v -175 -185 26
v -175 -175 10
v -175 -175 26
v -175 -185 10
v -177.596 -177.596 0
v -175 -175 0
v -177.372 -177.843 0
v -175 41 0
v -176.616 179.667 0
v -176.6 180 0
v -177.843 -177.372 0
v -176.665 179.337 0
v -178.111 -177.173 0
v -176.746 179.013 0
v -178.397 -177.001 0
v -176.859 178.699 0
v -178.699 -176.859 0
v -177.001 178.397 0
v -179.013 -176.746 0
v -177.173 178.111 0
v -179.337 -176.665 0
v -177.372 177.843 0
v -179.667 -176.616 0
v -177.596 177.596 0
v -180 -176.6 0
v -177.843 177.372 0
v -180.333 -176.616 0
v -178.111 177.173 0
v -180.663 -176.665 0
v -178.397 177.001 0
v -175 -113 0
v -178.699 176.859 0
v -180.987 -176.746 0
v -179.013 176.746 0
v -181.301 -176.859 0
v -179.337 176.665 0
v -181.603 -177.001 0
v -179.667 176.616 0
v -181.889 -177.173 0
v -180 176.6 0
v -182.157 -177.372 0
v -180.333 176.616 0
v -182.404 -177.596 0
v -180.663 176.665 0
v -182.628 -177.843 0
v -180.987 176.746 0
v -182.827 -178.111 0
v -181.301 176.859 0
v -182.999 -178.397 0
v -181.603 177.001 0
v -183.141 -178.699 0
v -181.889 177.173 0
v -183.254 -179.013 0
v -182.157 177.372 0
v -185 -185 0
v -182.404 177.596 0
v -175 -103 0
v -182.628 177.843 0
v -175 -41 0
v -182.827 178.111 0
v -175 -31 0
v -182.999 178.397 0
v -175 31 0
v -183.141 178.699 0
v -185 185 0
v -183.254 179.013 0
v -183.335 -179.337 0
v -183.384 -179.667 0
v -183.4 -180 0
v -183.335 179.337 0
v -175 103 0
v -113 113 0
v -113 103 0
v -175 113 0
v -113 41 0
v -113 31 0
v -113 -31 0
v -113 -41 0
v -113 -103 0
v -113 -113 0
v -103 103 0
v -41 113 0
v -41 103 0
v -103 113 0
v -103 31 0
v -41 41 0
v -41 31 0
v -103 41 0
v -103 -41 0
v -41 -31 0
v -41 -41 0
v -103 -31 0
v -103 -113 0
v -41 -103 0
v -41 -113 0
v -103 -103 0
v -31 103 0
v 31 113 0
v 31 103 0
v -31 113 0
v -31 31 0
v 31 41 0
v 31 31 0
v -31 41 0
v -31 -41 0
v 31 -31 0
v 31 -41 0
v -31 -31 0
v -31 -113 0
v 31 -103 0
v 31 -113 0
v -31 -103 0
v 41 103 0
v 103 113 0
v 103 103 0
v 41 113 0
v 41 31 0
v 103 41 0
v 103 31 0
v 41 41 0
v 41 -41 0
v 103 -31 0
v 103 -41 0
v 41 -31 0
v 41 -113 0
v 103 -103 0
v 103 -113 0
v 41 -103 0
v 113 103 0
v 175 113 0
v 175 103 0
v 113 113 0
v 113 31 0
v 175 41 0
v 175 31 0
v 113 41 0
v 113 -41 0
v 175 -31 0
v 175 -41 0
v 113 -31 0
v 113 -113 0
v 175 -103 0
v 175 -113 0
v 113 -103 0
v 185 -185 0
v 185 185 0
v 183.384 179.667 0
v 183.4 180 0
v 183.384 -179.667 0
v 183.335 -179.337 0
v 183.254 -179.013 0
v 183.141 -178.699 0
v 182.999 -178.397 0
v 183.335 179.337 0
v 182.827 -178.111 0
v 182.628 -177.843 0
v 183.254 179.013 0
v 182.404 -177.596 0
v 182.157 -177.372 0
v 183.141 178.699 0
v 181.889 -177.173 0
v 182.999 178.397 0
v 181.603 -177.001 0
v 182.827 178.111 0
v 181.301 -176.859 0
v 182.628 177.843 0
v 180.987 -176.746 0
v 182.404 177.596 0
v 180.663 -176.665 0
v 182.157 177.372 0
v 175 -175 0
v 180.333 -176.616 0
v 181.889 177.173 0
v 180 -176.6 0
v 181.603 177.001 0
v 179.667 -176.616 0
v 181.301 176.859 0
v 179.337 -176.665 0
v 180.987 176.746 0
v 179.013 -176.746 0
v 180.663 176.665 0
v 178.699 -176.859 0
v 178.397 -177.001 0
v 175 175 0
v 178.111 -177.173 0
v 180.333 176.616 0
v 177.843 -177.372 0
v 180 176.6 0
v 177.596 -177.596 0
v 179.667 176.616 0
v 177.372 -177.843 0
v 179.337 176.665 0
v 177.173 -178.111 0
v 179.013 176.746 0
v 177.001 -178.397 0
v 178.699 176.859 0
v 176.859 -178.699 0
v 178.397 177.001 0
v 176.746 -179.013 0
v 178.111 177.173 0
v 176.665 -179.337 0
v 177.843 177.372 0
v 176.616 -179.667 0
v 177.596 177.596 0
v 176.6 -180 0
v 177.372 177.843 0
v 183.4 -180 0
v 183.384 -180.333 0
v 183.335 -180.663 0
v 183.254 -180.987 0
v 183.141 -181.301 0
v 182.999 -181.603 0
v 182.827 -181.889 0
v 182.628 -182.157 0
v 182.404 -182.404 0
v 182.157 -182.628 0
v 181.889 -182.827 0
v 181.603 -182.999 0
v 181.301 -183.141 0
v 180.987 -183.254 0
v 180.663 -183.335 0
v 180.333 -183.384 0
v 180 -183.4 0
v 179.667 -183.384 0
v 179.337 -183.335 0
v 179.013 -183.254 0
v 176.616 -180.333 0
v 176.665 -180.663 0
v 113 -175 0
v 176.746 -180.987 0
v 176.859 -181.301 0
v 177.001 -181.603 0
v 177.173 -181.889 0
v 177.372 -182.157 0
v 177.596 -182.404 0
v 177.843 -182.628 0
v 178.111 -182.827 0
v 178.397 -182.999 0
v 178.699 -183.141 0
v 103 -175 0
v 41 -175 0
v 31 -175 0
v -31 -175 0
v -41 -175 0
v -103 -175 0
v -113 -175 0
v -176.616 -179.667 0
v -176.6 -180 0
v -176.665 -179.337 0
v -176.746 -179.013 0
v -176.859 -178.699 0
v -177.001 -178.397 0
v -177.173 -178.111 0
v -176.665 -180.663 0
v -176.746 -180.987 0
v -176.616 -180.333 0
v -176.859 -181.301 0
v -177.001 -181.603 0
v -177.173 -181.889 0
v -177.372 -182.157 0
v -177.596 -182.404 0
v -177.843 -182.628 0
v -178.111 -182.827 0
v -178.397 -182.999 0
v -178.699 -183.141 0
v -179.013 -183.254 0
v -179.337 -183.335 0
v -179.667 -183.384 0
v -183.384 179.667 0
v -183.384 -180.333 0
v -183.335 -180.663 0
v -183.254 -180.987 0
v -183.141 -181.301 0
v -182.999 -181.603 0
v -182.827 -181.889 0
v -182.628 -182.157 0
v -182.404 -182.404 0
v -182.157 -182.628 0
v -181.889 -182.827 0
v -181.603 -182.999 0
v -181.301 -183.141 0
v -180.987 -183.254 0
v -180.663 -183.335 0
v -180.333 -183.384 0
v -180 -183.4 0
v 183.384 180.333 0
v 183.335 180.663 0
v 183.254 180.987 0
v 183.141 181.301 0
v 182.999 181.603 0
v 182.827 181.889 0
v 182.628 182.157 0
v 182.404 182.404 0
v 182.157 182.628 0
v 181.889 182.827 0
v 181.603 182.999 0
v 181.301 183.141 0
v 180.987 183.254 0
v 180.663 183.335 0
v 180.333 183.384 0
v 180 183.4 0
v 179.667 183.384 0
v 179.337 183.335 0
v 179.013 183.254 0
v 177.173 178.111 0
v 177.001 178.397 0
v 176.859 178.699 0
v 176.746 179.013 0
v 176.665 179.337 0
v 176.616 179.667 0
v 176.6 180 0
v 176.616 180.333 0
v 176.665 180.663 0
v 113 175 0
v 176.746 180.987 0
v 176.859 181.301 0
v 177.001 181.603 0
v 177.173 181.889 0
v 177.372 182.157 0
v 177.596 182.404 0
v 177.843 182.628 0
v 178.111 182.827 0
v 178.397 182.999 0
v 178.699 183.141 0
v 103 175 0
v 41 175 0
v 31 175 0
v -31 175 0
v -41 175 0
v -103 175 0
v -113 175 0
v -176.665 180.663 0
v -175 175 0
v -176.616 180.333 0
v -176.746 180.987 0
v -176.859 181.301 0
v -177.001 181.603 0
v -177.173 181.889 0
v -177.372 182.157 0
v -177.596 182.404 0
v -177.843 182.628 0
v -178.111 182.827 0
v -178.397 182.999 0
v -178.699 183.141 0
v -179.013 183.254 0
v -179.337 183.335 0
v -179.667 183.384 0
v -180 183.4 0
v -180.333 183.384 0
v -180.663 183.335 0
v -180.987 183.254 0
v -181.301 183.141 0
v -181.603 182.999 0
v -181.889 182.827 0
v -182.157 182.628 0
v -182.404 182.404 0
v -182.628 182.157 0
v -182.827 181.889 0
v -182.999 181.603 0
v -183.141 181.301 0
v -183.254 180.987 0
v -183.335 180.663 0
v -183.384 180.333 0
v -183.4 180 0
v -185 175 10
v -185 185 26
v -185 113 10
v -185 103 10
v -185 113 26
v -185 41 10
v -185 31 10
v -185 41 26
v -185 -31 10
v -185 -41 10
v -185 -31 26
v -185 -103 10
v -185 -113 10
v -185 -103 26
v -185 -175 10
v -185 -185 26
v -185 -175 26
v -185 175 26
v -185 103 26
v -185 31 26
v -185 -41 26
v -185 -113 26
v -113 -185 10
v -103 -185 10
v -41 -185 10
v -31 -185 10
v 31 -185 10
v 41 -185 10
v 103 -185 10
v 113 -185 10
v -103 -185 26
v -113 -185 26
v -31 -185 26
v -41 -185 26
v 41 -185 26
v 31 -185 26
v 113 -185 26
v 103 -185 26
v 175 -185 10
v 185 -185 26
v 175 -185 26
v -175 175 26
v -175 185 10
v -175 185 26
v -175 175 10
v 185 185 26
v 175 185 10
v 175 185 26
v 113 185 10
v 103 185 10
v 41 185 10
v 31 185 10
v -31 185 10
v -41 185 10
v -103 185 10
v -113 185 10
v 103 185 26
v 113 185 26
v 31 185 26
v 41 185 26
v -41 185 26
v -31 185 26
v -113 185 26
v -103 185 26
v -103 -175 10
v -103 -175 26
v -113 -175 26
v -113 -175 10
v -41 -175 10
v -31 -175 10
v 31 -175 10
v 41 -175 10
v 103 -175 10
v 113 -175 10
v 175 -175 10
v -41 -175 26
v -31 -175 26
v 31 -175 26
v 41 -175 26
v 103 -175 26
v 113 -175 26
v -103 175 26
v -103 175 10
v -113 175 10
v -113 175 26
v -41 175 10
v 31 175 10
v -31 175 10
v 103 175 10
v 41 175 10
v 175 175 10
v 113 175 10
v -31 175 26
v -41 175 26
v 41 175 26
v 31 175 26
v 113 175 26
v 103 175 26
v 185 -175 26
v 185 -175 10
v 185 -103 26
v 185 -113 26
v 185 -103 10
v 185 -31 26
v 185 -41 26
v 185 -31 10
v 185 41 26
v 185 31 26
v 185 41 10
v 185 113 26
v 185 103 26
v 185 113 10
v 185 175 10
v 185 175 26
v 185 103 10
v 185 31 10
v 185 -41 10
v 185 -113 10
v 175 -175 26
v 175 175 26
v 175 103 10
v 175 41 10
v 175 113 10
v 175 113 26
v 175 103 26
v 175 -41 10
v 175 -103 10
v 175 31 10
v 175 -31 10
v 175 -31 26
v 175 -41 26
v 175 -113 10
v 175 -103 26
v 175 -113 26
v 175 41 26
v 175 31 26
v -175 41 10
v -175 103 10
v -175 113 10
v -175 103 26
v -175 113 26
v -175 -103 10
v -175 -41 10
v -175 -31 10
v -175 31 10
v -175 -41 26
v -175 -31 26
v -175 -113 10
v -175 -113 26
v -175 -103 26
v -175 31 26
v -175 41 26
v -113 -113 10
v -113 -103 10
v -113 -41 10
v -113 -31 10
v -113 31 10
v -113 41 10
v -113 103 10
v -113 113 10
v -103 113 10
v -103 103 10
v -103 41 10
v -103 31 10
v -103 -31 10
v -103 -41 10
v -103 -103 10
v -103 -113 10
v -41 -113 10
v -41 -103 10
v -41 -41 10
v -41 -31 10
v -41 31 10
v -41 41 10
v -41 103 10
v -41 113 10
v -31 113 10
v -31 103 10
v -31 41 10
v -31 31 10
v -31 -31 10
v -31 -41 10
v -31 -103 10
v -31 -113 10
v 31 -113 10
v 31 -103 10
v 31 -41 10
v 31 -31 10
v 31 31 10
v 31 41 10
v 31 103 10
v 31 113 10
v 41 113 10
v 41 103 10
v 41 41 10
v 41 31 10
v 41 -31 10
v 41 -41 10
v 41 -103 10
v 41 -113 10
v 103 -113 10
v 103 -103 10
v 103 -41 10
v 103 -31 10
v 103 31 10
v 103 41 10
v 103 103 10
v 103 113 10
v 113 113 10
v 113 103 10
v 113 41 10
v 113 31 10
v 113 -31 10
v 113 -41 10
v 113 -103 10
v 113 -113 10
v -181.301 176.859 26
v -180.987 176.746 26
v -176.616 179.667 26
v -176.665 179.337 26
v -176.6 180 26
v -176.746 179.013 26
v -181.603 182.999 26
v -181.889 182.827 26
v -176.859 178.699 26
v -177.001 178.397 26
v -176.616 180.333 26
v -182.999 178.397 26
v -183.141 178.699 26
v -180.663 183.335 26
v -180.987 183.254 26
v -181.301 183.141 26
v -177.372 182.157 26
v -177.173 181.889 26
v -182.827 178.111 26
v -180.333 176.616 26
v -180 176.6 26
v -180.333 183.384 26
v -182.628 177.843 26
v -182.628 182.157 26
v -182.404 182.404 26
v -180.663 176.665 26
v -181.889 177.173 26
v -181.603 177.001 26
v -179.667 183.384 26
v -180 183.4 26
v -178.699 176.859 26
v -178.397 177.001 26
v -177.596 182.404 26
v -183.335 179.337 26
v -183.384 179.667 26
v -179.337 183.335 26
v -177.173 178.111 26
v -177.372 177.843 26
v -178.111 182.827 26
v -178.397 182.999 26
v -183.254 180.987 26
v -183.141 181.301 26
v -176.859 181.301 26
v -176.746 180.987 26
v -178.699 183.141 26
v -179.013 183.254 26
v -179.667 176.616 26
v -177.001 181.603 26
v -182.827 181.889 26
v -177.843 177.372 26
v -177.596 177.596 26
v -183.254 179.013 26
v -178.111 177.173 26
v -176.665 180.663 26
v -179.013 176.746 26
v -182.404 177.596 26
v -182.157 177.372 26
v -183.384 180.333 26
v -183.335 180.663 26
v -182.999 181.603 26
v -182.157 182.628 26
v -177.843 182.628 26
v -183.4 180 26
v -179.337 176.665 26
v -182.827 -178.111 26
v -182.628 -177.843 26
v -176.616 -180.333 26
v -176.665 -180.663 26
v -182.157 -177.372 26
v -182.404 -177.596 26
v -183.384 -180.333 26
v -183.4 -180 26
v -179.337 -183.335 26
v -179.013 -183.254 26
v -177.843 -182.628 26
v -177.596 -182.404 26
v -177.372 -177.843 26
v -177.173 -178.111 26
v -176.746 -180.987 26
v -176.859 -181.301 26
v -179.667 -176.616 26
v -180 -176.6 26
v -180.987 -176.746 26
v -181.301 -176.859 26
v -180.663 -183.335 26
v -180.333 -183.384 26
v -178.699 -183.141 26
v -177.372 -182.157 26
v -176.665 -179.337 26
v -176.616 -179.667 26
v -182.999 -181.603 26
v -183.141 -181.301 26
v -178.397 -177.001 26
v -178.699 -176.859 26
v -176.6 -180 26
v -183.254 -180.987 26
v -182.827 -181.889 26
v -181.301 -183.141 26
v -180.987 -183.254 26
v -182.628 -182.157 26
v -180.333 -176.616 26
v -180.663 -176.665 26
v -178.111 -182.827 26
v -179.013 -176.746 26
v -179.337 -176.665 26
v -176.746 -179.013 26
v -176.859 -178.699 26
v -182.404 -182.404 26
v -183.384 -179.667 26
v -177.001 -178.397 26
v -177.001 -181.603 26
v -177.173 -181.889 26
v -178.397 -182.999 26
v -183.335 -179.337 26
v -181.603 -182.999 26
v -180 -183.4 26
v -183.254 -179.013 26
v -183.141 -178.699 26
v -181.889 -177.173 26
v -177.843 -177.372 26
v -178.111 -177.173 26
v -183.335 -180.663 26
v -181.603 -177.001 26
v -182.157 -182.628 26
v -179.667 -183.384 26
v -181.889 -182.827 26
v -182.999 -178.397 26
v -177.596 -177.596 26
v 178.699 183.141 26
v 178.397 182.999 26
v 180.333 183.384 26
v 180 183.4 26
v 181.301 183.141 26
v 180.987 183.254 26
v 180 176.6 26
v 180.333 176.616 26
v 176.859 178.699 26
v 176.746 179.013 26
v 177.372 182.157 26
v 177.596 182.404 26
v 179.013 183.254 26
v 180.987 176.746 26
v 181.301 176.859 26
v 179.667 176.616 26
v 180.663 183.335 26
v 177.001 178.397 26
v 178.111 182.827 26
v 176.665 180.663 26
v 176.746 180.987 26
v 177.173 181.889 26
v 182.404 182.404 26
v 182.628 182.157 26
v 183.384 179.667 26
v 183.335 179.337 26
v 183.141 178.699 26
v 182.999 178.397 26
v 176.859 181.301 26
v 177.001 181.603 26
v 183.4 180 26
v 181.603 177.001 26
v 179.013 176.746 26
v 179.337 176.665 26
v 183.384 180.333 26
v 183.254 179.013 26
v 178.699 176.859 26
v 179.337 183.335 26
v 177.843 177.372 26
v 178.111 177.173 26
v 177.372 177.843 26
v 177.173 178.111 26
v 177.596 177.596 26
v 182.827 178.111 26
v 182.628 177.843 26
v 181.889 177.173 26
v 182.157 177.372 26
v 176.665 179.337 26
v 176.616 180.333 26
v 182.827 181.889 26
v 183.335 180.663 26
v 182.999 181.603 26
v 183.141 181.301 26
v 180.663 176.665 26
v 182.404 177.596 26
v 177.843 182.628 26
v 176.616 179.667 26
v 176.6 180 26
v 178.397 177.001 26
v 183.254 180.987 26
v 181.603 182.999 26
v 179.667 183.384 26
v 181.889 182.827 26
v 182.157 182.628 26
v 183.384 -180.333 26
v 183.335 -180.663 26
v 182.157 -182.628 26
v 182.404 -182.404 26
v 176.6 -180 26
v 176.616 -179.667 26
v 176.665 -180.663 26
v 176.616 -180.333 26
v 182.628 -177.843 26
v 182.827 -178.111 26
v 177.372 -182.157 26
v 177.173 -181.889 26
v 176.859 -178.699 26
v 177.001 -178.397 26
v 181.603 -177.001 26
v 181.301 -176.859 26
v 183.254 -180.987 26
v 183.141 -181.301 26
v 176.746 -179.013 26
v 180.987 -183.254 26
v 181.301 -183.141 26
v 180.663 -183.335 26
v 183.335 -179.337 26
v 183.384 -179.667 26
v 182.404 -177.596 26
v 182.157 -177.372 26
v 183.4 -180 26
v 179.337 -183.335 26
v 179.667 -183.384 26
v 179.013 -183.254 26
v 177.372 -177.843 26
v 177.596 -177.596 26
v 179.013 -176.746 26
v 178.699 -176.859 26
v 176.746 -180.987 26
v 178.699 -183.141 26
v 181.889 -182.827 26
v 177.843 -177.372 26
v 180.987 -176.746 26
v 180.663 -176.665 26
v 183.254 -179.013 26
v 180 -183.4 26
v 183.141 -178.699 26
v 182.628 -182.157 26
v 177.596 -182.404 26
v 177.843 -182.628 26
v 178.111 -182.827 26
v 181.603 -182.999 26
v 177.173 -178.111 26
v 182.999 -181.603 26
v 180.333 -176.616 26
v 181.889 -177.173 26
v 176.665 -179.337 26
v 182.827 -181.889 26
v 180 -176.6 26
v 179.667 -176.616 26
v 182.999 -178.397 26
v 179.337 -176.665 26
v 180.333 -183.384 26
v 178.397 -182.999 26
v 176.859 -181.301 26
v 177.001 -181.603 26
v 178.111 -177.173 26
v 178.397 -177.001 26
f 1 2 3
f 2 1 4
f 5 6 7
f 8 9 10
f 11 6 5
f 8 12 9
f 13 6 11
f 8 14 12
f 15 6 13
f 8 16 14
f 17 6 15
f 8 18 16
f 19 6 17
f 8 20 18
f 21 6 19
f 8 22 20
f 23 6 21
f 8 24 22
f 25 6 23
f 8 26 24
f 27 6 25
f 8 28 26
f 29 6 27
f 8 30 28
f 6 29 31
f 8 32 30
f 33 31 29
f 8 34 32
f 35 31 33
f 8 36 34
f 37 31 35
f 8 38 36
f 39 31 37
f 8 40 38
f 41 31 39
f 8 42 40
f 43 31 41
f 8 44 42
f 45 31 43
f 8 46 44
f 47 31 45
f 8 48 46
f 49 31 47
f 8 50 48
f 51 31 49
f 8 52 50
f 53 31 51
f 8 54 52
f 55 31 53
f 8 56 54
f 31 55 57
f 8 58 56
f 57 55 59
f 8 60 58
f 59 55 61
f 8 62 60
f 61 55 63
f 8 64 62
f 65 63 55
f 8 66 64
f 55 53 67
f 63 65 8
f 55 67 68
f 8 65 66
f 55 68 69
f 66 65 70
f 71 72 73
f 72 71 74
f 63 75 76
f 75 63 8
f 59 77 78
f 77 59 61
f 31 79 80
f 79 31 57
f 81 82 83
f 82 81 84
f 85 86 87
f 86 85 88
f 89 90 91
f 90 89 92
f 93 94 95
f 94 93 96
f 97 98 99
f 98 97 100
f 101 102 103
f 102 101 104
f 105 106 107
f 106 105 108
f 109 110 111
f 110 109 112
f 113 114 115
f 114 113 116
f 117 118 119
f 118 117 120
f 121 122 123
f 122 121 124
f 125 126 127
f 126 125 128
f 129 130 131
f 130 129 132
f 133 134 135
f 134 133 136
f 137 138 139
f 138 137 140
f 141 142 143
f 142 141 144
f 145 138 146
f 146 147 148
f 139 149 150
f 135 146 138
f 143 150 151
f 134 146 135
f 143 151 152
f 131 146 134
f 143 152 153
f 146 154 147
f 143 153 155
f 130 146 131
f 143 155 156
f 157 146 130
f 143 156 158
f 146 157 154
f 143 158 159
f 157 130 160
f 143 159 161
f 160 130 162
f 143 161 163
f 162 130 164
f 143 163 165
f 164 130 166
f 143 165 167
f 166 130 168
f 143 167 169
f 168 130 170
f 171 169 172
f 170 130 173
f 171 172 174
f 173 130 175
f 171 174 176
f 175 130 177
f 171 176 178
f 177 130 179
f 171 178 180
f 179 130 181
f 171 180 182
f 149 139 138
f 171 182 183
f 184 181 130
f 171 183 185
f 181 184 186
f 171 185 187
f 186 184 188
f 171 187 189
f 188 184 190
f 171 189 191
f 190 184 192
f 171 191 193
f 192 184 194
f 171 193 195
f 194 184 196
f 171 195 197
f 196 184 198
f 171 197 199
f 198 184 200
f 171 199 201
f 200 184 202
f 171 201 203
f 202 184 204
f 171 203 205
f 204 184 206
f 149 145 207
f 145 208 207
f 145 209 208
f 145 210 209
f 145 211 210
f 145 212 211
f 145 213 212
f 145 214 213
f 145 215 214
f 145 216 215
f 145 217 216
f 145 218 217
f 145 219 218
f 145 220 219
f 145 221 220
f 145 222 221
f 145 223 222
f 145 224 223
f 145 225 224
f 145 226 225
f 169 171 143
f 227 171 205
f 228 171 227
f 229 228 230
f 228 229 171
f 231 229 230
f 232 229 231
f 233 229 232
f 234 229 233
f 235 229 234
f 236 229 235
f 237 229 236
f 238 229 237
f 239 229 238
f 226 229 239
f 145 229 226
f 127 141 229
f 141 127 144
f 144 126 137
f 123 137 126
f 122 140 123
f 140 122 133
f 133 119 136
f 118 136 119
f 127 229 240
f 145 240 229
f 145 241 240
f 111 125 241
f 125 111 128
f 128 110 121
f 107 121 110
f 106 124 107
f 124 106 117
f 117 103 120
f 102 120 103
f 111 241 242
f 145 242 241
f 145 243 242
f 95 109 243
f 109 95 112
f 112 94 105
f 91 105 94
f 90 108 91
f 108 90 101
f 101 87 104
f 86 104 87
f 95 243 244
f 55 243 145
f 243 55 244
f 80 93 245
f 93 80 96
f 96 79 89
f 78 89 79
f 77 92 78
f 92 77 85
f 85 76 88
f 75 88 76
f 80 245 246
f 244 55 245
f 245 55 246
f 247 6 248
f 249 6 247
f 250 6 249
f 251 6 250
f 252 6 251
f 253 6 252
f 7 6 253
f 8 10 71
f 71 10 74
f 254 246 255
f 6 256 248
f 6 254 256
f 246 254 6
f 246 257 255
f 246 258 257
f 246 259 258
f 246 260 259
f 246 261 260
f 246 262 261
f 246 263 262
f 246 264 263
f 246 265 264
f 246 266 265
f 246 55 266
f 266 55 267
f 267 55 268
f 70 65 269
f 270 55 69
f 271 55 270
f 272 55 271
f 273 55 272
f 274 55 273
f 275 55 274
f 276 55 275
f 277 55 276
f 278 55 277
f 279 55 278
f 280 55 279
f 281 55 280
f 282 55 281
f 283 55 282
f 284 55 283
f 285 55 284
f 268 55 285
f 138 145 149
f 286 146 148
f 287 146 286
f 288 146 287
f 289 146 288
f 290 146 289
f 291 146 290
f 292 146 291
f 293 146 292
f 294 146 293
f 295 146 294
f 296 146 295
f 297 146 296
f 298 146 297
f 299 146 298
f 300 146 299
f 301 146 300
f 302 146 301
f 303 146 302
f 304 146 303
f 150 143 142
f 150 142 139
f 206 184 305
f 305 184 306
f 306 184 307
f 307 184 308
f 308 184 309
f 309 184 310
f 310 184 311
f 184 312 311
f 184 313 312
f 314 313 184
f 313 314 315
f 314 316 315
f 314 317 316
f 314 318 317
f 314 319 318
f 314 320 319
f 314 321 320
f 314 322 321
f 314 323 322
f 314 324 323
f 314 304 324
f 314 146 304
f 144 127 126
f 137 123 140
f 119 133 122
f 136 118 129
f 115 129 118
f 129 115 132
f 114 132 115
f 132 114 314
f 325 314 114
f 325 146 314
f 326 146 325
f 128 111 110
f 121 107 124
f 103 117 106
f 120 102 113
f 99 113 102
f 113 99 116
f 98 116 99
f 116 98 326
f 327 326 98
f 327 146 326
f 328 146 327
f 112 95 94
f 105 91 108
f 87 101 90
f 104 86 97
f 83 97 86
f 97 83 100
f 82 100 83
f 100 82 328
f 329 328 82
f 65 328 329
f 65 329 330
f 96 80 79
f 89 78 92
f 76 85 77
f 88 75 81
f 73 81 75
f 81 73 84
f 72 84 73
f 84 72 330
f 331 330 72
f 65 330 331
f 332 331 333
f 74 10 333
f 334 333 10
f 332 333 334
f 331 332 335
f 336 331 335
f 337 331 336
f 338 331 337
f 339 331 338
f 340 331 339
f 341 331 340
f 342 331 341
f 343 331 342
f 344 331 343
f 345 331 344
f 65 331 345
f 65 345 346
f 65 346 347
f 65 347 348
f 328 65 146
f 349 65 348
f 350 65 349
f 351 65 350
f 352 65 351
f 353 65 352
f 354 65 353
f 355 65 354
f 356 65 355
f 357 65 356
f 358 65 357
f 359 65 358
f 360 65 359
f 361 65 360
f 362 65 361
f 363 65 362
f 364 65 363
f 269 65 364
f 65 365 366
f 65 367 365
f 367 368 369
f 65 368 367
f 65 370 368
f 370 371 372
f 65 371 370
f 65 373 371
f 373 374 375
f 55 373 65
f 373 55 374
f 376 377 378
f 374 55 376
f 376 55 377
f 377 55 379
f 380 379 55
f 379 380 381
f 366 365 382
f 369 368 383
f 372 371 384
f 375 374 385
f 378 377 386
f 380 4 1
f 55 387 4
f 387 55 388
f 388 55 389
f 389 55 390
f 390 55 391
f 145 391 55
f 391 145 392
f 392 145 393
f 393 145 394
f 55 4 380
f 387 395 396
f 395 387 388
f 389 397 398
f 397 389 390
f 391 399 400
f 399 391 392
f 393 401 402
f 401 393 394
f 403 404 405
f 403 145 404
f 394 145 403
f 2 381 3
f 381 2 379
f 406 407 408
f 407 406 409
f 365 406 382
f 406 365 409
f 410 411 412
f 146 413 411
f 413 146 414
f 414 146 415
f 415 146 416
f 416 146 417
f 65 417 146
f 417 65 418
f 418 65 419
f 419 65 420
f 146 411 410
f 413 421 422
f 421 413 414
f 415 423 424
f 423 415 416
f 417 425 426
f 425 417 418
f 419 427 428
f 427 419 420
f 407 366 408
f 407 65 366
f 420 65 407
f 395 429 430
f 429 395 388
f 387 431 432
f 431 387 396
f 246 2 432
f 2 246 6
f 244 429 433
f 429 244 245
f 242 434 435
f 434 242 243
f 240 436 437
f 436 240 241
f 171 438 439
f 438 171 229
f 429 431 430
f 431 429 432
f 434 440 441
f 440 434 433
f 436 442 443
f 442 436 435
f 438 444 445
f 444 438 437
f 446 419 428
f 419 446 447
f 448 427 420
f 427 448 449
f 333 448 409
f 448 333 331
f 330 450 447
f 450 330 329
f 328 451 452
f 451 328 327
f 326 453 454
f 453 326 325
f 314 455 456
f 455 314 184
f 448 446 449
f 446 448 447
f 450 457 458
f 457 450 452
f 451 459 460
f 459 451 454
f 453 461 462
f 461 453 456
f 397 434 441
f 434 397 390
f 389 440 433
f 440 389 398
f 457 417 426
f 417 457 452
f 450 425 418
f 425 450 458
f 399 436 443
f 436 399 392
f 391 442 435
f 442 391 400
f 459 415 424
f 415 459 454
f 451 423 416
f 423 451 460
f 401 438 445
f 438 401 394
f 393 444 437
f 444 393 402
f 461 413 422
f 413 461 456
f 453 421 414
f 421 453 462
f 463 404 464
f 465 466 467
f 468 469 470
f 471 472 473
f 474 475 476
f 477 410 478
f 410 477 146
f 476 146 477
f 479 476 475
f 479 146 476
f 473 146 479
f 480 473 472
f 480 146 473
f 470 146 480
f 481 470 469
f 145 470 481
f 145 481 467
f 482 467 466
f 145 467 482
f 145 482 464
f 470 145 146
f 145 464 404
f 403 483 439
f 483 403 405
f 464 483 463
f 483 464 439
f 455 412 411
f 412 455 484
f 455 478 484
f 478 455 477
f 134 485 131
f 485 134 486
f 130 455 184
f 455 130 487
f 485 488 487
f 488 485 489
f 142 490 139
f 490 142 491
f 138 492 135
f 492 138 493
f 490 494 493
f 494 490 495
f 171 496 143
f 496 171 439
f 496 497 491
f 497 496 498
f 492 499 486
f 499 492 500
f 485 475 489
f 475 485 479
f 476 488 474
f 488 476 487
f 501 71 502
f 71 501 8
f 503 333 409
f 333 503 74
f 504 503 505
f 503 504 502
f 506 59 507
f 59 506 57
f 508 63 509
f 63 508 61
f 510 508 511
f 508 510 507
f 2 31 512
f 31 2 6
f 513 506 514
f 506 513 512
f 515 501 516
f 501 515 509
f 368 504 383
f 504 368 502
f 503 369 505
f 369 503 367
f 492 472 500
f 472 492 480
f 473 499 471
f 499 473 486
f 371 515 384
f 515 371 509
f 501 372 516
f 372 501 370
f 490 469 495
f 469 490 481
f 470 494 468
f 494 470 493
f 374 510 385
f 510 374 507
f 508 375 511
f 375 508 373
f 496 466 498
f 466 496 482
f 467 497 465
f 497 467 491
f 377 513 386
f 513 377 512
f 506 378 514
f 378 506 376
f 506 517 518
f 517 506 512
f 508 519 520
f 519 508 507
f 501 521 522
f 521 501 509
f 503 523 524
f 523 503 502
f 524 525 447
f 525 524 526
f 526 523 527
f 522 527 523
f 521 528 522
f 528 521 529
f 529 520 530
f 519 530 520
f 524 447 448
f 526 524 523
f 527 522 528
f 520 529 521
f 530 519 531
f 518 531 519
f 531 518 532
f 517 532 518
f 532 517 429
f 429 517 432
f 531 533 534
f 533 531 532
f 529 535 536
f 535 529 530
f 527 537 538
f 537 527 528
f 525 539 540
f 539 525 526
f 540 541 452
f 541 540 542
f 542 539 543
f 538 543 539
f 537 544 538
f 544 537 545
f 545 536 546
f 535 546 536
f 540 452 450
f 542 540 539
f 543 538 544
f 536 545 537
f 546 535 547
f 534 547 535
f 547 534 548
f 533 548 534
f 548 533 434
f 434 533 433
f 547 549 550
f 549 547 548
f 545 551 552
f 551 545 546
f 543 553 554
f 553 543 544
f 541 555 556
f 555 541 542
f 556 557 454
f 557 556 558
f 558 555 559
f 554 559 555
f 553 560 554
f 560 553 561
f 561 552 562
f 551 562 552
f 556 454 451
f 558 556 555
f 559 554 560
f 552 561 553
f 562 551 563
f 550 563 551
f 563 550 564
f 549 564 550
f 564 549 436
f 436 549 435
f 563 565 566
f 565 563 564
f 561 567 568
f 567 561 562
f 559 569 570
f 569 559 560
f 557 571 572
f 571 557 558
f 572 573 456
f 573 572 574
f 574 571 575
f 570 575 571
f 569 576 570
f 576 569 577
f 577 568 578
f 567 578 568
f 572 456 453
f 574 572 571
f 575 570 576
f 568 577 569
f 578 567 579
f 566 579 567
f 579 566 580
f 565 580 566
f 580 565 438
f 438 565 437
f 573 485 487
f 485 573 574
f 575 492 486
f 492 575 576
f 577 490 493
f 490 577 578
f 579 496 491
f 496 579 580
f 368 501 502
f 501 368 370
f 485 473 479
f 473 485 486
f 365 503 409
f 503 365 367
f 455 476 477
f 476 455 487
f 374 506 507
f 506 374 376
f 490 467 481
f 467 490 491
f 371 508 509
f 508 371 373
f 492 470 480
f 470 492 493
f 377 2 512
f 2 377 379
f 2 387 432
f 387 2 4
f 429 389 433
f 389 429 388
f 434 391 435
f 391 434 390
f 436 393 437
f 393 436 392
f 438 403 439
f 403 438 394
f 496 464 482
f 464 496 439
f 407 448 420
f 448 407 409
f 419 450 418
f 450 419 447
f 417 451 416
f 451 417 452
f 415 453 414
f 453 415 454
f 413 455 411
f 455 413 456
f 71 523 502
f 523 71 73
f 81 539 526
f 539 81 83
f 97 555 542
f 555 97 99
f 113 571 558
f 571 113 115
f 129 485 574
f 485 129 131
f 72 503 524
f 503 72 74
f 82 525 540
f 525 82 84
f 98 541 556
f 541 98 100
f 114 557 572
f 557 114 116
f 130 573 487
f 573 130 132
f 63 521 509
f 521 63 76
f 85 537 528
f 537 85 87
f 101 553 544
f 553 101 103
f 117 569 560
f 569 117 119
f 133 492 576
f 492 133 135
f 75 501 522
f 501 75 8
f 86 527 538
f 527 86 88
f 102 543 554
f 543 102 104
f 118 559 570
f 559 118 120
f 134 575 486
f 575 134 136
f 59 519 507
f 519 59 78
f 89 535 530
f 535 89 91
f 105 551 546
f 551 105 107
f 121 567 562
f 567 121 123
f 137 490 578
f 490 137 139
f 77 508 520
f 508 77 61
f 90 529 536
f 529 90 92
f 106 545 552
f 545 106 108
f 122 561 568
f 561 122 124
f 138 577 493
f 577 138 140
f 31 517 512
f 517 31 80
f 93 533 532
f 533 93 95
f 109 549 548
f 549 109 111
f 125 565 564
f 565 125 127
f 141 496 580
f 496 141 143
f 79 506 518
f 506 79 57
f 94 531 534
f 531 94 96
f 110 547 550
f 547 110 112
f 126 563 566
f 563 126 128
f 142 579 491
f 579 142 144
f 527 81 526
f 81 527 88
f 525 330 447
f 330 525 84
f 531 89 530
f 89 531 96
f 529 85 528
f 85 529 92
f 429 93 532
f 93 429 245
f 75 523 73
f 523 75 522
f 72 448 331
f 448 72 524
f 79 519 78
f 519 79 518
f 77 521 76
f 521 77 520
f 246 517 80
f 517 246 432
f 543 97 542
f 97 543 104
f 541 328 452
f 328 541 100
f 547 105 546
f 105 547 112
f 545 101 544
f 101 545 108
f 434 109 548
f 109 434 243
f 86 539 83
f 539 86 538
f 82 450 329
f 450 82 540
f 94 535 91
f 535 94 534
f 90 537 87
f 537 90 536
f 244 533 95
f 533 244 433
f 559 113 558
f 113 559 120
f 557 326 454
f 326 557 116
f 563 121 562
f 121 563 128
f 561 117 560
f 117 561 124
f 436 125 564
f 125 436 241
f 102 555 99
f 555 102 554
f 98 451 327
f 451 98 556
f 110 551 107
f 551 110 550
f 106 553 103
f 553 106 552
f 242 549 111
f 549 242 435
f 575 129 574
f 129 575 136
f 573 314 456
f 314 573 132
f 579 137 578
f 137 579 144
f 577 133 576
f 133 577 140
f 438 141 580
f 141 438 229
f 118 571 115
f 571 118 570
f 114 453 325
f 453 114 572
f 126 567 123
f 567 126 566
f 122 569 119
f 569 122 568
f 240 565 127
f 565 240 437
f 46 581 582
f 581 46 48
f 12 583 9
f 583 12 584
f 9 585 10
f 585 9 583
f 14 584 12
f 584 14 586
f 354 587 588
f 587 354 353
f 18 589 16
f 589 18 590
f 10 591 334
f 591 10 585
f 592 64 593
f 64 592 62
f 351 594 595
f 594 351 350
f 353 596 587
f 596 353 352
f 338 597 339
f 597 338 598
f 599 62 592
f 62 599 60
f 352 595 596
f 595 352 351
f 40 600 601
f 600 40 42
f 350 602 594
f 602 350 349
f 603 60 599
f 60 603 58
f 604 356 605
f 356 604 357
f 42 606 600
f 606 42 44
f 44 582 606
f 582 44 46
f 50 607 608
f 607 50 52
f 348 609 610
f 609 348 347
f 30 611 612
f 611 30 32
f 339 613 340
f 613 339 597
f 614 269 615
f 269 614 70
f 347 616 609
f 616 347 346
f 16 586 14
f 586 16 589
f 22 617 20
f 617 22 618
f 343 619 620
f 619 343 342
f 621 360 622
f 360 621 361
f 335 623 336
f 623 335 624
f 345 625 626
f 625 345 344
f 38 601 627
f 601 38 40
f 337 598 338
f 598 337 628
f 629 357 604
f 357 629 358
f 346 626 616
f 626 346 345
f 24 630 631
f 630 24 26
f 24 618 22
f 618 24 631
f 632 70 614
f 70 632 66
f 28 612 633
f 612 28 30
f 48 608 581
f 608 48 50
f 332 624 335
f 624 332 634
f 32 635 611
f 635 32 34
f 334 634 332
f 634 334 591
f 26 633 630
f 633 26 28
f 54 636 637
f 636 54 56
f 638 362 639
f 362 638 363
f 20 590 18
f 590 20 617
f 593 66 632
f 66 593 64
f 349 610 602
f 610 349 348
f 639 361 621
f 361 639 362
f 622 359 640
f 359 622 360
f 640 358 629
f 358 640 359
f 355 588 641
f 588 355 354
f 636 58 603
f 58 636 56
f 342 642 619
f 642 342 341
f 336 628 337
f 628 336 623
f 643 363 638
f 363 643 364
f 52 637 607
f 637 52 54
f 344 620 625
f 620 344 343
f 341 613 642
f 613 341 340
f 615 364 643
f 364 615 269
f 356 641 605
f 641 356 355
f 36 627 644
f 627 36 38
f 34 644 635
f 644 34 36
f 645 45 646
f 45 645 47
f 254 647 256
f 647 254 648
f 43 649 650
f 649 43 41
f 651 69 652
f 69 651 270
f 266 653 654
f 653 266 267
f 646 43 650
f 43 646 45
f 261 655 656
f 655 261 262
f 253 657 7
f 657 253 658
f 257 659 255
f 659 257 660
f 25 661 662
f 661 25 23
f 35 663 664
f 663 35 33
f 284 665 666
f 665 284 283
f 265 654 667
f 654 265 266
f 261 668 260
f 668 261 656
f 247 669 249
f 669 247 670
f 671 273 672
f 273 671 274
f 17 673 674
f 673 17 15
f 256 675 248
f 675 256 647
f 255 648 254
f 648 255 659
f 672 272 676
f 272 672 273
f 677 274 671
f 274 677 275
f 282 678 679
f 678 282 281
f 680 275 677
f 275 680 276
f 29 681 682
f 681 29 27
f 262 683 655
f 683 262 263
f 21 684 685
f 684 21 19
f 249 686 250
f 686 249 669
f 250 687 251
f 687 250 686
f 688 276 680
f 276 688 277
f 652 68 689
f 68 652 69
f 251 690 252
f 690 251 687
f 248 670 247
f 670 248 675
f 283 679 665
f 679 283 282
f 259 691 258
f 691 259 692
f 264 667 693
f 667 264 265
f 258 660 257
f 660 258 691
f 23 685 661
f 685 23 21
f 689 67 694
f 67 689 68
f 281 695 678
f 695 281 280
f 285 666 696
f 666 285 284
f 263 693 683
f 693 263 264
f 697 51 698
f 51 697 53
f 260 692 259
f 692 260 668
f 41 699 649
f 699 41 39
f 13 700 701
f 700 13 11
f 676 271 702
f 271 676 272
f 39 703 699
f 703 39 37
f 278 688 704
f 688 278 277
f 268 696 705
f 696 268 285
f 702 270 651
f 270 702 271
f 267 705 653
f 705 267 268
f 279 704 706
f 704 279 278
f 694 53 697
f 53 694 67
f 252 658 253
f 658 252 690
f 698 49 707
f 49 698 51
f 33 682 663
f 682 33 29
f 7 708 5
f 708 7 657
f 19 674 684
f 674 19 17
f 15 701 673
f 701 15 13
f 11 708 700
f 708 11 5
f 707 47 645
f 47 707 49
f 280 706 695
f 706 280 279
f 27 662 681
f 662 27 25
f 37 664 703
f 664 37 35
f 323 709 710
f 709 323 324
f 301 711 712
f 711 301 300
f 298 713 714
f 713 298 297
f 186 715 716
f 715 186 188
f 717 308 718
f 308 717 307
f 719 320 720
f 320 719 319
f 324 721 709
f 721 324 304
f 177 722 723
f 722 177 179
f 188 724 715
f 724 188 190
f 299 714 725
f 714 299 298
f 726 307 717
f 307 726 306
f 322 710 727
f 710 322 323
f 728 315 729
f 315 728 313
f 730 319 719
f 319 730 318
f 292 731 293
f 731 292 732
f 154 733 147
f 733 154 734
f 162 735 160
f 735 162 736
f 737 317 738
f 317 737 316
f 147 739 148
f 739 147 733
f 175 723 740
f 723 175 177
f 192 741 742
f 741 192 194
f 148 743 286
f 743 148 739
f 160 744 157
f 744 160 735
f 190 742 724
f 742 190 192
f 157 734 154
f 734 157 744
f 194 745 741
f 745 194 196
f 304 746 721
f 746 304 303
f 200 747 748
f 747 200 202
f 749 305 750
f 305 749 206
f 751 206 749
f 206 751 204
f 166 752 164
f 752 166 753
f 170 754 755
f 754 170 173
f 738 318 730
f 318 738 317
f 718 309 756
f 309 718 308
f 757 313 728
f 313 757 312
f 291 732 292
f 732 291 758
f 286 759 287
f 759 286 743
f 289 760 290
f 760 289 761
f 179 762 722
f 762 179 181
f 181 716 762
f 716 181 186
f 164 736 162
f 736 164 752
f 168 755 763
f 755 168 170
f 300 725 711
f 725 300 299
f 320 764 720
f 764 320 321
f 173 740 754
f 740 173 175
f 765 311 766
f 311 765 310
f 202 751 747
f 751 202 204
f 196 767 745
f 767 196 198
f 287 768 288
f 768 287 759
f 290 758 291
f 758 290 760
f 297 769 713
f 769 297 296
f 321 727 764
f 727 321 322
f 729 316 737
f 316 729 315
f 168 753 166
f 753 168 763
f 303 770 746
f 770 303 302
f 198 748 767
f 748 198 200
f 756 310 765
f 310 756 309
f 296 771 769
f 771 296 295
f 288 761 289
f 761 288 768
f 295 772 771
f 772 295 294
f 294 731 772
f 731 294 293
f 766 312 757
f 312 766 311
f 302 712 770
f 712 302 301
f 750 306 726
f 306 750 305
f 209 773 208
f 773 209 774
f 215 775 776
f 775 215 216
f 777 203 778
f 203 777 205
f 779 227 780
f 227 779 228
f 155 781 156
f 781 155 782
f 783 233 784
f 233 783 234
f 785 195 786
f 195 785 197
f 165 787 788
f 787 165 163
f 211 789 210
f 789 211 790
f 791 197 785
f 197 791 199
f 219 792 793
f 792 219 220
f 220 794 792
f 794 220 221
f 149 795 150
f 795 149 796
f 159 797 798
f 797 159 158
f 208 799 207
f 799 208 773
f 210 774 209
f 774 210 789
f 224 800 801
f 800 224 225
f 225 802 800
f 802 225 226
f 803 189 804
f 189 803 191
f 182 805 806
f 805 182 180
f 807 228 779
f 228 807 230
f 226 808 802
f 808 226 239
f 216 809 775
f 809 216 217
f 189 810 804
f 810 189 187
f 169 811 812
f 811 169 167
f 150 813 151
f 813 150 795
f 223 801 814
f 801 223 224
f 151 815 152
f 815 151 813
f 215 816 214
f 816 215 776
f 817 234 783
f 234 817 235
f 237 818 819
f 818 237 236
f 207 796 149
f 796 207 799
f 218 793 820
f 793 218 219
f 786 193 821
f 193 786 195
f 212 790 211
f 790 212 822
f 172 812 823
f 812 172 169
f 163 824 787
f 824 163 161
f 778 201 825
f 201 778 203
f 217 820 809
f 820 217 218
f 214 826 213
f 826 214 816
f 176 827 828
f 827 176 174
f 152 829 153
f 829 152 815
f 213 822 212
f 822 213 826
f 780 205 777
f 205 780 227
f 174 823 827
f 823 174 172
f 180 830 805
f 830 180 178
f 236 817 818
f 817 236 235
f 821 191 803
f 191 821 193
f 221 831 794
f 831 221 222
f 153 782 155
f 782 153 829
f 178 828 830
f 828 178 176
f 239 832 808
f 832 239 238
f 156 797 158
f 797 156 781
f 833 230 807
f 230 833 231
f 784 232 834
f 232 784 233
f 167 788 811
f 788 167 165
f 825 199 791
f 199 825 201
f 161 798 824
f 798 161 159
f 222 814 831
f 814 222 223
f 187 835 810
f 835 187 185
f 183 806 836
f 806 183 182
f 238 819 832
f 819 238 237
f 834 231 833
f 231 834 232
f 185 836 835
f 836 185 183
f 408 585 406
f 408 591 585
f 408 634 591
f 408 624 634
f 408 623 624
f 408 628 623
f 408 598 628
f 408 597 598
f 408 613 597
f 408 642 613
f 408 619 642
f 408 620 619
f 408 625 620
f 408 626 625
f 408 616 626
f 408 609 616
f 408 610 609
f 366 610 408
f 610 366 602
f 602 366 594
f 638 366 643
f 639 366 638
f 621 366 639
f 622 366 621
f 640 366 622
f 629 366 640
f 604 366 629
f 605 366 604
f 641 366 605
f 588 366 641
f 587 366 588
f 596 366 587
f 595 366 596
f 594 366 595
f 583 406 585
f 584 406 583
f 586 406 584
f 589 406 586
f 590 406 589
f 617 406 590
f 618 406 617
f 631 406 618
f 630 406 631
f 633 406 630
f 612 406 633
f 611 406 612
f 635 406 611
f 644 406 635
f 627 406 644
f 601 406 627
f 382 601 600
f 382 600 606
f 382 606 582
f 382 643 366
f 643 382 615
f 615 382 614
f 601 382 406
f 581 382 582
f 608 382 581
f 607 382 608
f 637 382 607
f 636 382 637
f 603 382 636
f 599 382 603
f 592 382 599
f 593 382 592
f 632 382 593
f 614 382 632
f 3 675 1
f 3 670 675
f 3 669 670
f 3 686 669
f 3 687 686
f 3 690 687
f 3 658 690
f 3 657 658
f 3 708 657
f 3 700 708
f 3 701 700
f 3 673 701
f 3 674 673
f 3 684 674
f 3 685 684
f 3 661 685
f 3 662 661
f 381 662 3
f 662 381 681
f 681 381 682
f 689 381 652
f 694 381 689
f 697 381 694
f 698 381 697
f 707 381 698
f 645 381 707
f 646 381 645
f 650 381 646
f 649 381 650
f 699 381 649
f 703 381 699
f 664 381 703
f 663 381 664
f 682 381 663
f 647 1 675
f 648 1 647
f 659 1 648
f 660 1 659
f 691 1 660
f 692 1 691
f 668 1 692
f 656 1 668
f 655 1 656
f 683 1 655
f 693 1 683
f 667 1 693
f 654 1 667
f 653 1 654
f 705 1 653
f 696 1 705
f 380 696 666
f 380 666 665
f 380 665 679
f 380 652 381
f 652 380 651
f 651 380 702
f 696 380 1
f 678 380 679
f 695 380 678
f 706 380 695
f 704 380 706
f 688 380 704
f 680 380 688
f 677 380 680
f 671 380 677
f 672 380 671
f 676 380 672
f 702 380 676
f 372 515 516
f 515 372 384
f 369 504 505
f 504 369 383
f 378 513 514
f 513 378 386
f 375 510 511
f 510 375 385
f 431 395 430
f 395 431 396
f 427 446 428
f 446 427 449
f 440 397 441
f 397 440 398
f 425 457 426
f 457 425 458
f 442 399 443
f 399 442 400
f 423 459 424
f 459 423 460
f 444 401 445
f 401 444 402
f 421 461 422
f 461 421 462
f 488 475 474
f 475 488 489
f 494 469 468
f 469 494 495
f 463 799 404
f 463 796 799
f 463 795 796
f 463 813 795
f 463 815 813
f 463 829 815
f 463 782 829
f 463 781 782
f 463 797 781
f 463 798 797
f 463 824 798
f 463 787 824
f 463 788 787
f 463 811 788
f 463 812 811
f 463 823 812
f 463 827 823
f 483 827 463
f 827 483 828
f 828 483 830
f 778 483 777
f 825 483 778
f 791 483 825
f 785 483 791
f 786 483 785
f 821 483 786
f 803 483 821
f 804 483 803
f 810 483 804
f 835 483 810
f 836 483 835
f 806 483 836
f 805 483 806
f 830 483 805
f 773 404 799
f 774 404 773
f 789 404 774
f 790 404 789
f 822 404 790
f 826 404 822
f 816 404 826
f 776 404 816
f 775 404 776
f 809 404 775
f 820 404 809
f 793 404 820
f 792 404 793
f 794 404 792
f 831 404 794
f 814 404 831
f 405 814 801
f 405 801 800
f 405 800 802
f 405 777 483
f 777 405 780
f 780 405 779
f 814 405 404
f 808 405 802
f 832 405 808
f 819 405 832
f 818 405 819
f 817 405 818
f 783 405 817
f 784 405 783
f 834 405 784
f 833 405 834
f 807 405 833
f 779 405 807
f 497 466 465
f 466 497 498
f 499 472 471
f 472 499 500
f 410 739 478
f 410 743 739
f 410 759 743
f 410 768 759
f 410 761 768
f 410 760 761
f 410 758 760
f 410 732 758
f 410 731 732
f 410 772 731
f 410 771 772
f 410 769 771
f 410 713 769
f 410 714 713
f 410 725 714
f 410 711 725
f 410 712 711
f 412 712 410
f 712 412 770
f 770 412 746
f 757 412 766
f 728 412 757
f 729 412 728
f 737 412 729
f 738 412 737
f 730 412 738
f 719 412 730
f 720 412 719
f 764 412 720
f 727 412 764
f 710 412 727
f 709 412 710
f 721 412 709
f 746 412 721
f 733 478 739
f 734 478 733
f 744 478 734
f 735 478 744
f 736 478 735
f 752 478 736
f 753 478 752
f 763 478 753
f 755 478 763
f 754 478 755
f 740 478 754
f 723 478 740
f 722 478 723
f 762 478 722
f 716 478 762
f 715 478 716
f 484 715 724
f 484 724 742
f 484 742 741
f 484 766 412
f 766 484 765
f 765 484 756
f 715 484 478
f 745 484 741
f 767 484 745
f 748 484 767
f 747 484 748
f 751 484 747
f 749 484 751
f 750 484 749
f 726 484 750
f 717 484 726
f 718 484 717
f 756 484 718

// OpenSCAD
// Cage slice part (z0..z1). Units: mm.
// Print orientation: flipped (top grid prints on the bed, no supports)

bar=10;
inner=[350,350,700];
gap_xy=62;
gap_z=61;
hole_d=6.8;
$fn=64;

outer=[inner[0]+2*bar, inner[1]+2*bar, inner[2]+2*bar];
half=[outer[0]/2, outer[1]/2, outer[2]/2];

pitch_xy=bar+gap_xy;
pitch_z=bar+gap_z;

centers=[for(i=[0:5]) -(half[0]-bar/2) + i*pitch_xy];
z_levels=[for(i=[0:10]) i*pitch_z];

module vbar(xc,yc){ translate([xc-bar/2,yc-bar/2,0]) cube([bar,bar,outer[2]],center=false); }
module hbar_x(yc,z0){ translate([-half[0],yc-bar/2,z0]) cube([outer[0],bar,bar],center=false); }
module hbar_y(xc,z0){ translate([xc-bar/2,-half[1],z0]) cube([bar,outer[1],bar],center=false); }

module grid(z0){ union(){ for(yc=centers) hbar_x(yc,z0); for(xc=centers) hbar_y(xc,z0); } }

module side_verticals(){
  union(){
    for(xc=centers){ vbar(xc, half[1]-bar/2); vbar(xc,-half[1]+bar/2); }
    for(yc=centers){ vbar( half[0]-bar/2,yc); vbar(-half[0]+bar/2,yc); }
  }
}

module side_rings(){
  union(){
    for(z0=z_levels){
      hbar_x( half[1]-bar/2,z0); hbar_x(-half[1]+bar/2,z0);
      hbar_y( half[0]-bar/2,z0); hbar_y(-half[0]+bar/2,z0);
    }
  }
}

module rod_holes(){
  for(sx=[-1,1],sy=[-1,1]) translate([sx*(half[0]-bar/2), sy*(half[1]-bar/2), -1]) cylinder(d=hole_d,h=outer[2]+2,center=false);
}

module cage(){ difference(){ union(){ side_verticals(); side_rings(); grid(0); grid(outer[2]-bar); } rod_holes(); } }

module cage_slice(zmin,zmax){ intersection(){ cage(); translate([-1000,-1000,zmin]) cube([2000,2000,zmax-zmin],center=false); } }

z0=694; z1=720;
h=z1-z0;
translate([0,0,h]) rotate([180,0,0]) translate([0,0,-z0]) cage_slice(z0,z1);
